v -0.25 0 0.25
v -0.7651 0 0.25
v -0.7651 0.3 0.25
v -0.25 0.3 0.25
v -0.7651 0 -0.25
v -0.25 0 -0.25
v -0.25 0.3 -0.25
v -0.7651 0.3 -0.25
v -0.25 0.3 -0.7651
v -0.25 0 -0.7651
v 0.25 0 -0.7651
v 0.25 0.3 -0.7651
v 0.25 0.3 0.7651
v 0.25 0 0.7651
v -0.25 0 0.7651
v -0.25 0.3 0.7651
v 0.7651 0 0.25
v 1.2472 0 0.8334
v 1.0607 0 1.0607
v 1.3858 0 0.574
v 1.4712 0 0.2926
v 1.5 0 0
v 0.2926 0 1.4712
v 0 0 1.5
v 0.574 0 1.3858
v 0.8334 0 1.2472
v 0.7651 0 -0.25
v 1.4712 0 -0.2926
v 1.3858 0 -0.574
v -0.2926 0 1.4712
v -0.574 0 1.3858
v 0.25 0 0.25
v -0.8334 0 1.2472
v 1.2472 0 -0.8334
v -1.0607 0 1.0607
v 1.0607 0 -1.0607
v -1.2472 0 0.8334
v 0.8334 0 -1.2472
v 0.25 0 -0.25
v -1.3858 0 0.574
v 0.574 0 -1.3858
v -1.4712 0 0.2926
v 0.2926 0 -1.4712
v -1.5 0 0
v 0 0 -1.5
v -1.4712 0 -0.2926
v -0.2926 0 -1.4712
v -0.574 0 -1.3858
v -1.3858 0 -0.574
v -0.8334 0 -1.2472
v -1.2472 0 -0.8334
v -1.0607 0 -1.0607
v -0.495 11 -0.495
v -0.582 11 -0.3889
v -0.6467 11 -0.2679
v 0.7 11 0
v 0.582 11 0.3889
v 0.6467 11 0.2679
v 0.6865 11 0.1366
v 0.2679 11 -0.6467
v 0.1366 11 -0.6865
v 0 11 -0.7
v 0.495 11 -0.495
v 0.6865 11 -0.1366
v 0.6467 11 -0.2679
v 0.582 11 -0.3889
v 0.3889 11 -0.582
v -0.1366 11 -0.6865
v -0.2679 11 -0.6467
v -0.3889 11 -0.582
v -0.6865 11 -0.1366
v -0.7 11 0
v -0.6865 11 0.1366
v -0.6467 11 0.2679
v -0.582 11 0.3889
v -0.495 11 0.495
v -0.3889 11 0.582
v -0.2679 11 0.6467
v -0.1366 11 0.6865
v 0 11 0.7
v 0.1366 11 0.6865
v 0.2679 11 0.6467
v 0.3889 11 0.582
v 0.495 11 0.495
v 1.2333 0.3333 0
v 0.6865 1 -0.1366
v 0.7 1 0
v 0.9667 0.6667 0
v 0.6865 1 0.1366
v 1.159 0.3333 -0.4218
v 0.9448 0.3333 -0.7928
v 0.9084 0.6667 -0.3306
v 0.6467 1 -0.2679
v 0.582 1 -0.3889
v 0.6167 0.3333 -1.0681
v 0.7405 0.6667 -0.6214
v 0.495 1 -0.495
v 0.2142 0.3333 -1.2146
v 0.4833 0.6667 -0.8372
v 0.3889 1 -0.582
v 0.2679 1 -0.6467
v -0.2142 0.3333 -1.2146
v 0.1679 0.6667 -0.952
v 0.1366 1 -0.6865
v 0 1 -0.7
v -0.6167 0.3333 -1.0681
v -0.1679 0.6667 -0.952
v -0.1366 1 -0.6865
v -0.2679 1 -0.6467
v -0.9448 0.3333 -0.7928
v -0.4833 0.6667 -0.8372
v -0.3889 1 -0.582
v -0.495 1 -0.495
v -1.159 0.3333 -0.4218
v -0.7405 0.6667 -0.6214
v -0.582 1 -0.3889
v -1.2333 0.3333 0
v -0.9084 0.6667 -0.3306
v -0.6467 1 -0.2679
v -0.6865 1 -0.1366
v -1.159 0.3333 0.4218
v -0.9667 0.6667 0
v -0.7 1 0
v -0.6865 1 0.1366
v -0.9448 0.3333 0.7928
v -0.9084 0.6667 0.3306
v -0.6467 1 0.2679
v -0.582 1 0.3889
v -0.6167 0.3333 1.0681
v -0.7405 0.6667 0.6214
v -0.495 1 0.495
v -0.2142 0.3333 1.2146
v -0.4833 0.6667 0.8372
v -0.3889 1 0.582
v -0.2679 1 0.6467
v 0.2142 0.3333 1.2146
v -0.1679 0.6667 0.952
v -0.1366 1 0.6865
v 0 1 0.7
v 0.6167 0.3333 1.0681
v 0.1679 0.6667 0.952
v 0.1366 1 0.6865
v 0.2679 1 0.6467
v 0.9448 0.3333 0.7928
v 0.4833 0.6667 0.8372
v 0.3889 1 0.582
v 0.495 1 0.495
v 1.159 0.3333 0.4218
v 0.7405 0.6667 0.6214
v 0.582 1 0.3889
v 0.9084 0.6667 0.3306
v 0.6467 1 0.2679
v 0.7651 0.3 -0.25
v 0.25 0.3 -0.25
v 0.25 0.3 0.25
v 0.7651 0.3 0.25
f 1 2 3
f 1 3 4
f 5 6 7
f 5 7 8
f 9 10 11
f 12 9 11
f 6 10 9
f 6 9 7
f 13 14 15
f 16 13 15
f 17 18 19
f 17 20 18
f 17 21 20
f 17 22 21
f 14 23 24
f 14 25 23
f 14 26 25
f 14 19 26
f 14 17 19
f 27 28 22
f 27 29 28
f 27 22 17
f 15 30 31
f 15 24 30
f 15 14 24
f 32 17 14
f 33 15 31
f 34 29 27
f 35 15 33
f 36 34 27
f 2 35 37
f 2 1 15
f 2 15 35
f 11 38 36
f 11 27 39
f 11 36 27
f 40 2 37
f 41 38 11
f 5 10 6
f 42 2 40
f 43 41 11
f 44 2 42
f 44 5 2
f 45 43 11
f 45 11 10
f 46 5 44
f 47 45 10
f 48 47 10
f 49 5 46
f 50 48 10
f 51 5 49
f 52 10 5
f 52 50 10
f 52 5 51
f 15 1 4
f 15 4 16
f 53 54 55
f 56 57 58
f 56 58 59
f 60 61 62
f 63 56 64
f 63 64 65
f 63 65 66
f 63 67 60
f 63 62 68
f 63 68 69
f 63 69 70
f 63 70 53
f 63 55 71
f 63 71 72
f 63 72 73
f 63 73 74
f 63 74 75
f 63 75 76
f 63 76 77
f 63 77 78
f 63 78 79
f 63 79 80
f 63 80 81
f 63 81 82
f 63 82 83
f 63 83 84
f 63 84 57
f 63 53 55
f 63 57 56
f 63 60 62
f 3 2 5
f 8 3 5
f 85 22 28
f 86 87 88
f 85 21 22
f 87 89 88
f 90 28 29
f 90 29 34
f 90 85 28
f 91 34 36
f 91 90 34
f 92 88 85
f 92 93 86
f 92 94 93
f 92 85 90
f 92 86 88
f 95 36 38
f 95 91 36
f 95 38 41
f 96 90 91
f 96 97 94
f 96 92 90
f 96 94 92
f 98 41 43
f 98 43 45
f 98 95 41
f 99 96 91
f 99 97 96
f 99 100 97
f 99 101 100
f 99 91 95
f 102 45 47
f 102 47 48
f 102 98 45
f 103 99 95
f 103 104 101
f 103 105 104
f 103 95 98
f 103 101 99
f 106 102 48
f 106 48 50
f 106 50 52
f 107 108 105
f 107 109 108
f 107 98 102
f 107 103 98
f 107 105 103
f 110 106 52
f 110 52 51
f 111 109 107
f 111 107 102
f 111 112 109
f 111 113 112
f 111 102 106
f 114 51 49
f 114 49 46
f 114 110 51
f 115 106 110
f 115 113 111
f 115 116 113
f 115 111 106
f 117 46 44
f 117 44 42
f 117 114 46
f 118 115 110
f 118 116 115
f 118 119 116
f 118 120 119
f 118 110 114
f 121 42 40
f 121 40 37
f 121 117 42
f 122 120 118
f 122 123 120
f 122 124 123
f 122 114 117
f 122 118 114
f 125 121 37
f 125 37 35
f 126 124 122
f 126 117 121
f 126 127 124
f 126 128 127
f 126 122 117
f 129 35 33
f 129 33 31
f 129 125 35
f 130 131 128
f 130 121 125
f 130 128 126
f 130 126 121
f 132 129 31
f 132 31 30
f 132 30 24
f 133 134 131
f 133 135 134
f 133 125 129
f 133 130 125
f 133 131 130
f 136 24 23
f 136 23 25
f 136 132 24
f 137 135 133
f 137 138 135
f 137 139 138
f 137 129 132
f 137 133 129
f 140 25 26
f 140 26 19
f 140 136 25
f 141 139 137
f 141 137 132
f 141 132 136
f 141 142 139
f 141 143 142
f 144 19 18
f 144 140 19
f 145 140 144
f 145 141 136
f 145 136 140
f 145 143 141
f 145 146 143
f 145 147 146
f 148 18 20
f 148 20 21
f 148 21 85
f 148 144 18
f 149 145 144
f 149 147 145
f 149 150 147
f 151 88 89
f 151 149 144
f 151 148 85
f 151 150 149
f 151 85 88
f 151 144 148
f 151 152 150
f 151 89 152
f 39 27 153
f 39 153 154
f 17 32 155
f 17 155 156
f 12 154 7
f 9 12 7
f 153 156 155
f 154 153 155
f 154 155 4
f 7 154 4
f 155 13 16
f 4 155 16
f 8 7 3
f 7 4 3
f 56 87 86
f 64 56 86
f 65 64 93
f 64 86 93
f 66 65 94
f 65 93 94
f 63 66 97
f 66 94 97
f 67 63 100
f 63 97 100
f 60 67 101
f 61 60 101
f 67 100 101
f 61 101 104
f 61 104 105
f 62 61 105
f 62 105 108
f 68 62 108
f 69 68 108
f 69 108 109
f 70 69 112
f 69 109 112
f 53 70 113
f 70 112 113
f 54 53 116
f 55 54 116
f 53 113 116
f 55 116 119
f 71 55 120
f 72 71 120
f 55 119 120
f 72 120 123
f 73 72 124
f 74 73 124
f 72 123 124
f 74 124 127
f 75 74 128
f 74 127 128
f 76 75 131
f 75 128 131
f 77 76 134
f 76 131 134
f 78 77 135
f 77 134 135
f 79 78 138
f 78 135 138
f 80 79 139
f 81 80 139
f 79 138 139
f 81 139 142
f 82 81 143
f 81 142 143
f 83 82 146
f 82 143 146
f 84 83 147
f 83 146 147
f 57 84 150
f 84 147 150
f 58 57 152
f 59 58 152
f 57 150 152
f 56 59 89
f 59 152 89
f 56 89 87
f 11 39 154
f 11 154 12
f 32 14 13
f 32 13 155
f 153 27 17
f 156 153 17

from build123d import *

# Parameters (mm, degrees)
SKETCH_3_R          = 0.7
EXTRUDE_1_DEPTH     = 10
CUT_EXTRUDE_1_DEPTH = 0.3


with BuildPart() as part:
    # 草图2 → 旋转1 (revolve)
    with BuildSketch(Plane.XY):
        Polygon((0, 0), (1.5, 0), (0.7, 1), (0, 1), align=None)
    revolve(axis=Axis((0, 0, 0), (0, 1, 0)))

    # 草图3 → 凸台-拉伸1 (add)
    with BuildSketch(Plane(origin=(0, 1, 0), x_dir=(1, 0, 0), z_dir=(0, 1, 0))):
        Circle(SKETCH_3_R)
    extrude(amount=EXTRUDE_1_DEPTH)

    # 草图4 → 切除-拉伸1 (cut)
    with BuildSketch(Plane.XZ):
        Polygon((0.25, -0.25), (0.25, -0.765105953), (0, -0.765105953), (-0.25, -0.765105953), (-0.25, -0.25), (-0.765105953, -0.25), (-0.765105953, 0), (-0.765105953, 0.25), (-0.25, 0.25), (-0.25, 0.765105953), (0, 0.765105953), (0.25, 0.765105953), (0.25, 0.25), (0.765105953, 0.25), (0.765105953, 0), (0.765105953, -0.25), align=None)
    extrude(amount=-CUT_EXTRUDE_1_DEPTH, mode=Mode.SUBTRACT)


solid = part.part
